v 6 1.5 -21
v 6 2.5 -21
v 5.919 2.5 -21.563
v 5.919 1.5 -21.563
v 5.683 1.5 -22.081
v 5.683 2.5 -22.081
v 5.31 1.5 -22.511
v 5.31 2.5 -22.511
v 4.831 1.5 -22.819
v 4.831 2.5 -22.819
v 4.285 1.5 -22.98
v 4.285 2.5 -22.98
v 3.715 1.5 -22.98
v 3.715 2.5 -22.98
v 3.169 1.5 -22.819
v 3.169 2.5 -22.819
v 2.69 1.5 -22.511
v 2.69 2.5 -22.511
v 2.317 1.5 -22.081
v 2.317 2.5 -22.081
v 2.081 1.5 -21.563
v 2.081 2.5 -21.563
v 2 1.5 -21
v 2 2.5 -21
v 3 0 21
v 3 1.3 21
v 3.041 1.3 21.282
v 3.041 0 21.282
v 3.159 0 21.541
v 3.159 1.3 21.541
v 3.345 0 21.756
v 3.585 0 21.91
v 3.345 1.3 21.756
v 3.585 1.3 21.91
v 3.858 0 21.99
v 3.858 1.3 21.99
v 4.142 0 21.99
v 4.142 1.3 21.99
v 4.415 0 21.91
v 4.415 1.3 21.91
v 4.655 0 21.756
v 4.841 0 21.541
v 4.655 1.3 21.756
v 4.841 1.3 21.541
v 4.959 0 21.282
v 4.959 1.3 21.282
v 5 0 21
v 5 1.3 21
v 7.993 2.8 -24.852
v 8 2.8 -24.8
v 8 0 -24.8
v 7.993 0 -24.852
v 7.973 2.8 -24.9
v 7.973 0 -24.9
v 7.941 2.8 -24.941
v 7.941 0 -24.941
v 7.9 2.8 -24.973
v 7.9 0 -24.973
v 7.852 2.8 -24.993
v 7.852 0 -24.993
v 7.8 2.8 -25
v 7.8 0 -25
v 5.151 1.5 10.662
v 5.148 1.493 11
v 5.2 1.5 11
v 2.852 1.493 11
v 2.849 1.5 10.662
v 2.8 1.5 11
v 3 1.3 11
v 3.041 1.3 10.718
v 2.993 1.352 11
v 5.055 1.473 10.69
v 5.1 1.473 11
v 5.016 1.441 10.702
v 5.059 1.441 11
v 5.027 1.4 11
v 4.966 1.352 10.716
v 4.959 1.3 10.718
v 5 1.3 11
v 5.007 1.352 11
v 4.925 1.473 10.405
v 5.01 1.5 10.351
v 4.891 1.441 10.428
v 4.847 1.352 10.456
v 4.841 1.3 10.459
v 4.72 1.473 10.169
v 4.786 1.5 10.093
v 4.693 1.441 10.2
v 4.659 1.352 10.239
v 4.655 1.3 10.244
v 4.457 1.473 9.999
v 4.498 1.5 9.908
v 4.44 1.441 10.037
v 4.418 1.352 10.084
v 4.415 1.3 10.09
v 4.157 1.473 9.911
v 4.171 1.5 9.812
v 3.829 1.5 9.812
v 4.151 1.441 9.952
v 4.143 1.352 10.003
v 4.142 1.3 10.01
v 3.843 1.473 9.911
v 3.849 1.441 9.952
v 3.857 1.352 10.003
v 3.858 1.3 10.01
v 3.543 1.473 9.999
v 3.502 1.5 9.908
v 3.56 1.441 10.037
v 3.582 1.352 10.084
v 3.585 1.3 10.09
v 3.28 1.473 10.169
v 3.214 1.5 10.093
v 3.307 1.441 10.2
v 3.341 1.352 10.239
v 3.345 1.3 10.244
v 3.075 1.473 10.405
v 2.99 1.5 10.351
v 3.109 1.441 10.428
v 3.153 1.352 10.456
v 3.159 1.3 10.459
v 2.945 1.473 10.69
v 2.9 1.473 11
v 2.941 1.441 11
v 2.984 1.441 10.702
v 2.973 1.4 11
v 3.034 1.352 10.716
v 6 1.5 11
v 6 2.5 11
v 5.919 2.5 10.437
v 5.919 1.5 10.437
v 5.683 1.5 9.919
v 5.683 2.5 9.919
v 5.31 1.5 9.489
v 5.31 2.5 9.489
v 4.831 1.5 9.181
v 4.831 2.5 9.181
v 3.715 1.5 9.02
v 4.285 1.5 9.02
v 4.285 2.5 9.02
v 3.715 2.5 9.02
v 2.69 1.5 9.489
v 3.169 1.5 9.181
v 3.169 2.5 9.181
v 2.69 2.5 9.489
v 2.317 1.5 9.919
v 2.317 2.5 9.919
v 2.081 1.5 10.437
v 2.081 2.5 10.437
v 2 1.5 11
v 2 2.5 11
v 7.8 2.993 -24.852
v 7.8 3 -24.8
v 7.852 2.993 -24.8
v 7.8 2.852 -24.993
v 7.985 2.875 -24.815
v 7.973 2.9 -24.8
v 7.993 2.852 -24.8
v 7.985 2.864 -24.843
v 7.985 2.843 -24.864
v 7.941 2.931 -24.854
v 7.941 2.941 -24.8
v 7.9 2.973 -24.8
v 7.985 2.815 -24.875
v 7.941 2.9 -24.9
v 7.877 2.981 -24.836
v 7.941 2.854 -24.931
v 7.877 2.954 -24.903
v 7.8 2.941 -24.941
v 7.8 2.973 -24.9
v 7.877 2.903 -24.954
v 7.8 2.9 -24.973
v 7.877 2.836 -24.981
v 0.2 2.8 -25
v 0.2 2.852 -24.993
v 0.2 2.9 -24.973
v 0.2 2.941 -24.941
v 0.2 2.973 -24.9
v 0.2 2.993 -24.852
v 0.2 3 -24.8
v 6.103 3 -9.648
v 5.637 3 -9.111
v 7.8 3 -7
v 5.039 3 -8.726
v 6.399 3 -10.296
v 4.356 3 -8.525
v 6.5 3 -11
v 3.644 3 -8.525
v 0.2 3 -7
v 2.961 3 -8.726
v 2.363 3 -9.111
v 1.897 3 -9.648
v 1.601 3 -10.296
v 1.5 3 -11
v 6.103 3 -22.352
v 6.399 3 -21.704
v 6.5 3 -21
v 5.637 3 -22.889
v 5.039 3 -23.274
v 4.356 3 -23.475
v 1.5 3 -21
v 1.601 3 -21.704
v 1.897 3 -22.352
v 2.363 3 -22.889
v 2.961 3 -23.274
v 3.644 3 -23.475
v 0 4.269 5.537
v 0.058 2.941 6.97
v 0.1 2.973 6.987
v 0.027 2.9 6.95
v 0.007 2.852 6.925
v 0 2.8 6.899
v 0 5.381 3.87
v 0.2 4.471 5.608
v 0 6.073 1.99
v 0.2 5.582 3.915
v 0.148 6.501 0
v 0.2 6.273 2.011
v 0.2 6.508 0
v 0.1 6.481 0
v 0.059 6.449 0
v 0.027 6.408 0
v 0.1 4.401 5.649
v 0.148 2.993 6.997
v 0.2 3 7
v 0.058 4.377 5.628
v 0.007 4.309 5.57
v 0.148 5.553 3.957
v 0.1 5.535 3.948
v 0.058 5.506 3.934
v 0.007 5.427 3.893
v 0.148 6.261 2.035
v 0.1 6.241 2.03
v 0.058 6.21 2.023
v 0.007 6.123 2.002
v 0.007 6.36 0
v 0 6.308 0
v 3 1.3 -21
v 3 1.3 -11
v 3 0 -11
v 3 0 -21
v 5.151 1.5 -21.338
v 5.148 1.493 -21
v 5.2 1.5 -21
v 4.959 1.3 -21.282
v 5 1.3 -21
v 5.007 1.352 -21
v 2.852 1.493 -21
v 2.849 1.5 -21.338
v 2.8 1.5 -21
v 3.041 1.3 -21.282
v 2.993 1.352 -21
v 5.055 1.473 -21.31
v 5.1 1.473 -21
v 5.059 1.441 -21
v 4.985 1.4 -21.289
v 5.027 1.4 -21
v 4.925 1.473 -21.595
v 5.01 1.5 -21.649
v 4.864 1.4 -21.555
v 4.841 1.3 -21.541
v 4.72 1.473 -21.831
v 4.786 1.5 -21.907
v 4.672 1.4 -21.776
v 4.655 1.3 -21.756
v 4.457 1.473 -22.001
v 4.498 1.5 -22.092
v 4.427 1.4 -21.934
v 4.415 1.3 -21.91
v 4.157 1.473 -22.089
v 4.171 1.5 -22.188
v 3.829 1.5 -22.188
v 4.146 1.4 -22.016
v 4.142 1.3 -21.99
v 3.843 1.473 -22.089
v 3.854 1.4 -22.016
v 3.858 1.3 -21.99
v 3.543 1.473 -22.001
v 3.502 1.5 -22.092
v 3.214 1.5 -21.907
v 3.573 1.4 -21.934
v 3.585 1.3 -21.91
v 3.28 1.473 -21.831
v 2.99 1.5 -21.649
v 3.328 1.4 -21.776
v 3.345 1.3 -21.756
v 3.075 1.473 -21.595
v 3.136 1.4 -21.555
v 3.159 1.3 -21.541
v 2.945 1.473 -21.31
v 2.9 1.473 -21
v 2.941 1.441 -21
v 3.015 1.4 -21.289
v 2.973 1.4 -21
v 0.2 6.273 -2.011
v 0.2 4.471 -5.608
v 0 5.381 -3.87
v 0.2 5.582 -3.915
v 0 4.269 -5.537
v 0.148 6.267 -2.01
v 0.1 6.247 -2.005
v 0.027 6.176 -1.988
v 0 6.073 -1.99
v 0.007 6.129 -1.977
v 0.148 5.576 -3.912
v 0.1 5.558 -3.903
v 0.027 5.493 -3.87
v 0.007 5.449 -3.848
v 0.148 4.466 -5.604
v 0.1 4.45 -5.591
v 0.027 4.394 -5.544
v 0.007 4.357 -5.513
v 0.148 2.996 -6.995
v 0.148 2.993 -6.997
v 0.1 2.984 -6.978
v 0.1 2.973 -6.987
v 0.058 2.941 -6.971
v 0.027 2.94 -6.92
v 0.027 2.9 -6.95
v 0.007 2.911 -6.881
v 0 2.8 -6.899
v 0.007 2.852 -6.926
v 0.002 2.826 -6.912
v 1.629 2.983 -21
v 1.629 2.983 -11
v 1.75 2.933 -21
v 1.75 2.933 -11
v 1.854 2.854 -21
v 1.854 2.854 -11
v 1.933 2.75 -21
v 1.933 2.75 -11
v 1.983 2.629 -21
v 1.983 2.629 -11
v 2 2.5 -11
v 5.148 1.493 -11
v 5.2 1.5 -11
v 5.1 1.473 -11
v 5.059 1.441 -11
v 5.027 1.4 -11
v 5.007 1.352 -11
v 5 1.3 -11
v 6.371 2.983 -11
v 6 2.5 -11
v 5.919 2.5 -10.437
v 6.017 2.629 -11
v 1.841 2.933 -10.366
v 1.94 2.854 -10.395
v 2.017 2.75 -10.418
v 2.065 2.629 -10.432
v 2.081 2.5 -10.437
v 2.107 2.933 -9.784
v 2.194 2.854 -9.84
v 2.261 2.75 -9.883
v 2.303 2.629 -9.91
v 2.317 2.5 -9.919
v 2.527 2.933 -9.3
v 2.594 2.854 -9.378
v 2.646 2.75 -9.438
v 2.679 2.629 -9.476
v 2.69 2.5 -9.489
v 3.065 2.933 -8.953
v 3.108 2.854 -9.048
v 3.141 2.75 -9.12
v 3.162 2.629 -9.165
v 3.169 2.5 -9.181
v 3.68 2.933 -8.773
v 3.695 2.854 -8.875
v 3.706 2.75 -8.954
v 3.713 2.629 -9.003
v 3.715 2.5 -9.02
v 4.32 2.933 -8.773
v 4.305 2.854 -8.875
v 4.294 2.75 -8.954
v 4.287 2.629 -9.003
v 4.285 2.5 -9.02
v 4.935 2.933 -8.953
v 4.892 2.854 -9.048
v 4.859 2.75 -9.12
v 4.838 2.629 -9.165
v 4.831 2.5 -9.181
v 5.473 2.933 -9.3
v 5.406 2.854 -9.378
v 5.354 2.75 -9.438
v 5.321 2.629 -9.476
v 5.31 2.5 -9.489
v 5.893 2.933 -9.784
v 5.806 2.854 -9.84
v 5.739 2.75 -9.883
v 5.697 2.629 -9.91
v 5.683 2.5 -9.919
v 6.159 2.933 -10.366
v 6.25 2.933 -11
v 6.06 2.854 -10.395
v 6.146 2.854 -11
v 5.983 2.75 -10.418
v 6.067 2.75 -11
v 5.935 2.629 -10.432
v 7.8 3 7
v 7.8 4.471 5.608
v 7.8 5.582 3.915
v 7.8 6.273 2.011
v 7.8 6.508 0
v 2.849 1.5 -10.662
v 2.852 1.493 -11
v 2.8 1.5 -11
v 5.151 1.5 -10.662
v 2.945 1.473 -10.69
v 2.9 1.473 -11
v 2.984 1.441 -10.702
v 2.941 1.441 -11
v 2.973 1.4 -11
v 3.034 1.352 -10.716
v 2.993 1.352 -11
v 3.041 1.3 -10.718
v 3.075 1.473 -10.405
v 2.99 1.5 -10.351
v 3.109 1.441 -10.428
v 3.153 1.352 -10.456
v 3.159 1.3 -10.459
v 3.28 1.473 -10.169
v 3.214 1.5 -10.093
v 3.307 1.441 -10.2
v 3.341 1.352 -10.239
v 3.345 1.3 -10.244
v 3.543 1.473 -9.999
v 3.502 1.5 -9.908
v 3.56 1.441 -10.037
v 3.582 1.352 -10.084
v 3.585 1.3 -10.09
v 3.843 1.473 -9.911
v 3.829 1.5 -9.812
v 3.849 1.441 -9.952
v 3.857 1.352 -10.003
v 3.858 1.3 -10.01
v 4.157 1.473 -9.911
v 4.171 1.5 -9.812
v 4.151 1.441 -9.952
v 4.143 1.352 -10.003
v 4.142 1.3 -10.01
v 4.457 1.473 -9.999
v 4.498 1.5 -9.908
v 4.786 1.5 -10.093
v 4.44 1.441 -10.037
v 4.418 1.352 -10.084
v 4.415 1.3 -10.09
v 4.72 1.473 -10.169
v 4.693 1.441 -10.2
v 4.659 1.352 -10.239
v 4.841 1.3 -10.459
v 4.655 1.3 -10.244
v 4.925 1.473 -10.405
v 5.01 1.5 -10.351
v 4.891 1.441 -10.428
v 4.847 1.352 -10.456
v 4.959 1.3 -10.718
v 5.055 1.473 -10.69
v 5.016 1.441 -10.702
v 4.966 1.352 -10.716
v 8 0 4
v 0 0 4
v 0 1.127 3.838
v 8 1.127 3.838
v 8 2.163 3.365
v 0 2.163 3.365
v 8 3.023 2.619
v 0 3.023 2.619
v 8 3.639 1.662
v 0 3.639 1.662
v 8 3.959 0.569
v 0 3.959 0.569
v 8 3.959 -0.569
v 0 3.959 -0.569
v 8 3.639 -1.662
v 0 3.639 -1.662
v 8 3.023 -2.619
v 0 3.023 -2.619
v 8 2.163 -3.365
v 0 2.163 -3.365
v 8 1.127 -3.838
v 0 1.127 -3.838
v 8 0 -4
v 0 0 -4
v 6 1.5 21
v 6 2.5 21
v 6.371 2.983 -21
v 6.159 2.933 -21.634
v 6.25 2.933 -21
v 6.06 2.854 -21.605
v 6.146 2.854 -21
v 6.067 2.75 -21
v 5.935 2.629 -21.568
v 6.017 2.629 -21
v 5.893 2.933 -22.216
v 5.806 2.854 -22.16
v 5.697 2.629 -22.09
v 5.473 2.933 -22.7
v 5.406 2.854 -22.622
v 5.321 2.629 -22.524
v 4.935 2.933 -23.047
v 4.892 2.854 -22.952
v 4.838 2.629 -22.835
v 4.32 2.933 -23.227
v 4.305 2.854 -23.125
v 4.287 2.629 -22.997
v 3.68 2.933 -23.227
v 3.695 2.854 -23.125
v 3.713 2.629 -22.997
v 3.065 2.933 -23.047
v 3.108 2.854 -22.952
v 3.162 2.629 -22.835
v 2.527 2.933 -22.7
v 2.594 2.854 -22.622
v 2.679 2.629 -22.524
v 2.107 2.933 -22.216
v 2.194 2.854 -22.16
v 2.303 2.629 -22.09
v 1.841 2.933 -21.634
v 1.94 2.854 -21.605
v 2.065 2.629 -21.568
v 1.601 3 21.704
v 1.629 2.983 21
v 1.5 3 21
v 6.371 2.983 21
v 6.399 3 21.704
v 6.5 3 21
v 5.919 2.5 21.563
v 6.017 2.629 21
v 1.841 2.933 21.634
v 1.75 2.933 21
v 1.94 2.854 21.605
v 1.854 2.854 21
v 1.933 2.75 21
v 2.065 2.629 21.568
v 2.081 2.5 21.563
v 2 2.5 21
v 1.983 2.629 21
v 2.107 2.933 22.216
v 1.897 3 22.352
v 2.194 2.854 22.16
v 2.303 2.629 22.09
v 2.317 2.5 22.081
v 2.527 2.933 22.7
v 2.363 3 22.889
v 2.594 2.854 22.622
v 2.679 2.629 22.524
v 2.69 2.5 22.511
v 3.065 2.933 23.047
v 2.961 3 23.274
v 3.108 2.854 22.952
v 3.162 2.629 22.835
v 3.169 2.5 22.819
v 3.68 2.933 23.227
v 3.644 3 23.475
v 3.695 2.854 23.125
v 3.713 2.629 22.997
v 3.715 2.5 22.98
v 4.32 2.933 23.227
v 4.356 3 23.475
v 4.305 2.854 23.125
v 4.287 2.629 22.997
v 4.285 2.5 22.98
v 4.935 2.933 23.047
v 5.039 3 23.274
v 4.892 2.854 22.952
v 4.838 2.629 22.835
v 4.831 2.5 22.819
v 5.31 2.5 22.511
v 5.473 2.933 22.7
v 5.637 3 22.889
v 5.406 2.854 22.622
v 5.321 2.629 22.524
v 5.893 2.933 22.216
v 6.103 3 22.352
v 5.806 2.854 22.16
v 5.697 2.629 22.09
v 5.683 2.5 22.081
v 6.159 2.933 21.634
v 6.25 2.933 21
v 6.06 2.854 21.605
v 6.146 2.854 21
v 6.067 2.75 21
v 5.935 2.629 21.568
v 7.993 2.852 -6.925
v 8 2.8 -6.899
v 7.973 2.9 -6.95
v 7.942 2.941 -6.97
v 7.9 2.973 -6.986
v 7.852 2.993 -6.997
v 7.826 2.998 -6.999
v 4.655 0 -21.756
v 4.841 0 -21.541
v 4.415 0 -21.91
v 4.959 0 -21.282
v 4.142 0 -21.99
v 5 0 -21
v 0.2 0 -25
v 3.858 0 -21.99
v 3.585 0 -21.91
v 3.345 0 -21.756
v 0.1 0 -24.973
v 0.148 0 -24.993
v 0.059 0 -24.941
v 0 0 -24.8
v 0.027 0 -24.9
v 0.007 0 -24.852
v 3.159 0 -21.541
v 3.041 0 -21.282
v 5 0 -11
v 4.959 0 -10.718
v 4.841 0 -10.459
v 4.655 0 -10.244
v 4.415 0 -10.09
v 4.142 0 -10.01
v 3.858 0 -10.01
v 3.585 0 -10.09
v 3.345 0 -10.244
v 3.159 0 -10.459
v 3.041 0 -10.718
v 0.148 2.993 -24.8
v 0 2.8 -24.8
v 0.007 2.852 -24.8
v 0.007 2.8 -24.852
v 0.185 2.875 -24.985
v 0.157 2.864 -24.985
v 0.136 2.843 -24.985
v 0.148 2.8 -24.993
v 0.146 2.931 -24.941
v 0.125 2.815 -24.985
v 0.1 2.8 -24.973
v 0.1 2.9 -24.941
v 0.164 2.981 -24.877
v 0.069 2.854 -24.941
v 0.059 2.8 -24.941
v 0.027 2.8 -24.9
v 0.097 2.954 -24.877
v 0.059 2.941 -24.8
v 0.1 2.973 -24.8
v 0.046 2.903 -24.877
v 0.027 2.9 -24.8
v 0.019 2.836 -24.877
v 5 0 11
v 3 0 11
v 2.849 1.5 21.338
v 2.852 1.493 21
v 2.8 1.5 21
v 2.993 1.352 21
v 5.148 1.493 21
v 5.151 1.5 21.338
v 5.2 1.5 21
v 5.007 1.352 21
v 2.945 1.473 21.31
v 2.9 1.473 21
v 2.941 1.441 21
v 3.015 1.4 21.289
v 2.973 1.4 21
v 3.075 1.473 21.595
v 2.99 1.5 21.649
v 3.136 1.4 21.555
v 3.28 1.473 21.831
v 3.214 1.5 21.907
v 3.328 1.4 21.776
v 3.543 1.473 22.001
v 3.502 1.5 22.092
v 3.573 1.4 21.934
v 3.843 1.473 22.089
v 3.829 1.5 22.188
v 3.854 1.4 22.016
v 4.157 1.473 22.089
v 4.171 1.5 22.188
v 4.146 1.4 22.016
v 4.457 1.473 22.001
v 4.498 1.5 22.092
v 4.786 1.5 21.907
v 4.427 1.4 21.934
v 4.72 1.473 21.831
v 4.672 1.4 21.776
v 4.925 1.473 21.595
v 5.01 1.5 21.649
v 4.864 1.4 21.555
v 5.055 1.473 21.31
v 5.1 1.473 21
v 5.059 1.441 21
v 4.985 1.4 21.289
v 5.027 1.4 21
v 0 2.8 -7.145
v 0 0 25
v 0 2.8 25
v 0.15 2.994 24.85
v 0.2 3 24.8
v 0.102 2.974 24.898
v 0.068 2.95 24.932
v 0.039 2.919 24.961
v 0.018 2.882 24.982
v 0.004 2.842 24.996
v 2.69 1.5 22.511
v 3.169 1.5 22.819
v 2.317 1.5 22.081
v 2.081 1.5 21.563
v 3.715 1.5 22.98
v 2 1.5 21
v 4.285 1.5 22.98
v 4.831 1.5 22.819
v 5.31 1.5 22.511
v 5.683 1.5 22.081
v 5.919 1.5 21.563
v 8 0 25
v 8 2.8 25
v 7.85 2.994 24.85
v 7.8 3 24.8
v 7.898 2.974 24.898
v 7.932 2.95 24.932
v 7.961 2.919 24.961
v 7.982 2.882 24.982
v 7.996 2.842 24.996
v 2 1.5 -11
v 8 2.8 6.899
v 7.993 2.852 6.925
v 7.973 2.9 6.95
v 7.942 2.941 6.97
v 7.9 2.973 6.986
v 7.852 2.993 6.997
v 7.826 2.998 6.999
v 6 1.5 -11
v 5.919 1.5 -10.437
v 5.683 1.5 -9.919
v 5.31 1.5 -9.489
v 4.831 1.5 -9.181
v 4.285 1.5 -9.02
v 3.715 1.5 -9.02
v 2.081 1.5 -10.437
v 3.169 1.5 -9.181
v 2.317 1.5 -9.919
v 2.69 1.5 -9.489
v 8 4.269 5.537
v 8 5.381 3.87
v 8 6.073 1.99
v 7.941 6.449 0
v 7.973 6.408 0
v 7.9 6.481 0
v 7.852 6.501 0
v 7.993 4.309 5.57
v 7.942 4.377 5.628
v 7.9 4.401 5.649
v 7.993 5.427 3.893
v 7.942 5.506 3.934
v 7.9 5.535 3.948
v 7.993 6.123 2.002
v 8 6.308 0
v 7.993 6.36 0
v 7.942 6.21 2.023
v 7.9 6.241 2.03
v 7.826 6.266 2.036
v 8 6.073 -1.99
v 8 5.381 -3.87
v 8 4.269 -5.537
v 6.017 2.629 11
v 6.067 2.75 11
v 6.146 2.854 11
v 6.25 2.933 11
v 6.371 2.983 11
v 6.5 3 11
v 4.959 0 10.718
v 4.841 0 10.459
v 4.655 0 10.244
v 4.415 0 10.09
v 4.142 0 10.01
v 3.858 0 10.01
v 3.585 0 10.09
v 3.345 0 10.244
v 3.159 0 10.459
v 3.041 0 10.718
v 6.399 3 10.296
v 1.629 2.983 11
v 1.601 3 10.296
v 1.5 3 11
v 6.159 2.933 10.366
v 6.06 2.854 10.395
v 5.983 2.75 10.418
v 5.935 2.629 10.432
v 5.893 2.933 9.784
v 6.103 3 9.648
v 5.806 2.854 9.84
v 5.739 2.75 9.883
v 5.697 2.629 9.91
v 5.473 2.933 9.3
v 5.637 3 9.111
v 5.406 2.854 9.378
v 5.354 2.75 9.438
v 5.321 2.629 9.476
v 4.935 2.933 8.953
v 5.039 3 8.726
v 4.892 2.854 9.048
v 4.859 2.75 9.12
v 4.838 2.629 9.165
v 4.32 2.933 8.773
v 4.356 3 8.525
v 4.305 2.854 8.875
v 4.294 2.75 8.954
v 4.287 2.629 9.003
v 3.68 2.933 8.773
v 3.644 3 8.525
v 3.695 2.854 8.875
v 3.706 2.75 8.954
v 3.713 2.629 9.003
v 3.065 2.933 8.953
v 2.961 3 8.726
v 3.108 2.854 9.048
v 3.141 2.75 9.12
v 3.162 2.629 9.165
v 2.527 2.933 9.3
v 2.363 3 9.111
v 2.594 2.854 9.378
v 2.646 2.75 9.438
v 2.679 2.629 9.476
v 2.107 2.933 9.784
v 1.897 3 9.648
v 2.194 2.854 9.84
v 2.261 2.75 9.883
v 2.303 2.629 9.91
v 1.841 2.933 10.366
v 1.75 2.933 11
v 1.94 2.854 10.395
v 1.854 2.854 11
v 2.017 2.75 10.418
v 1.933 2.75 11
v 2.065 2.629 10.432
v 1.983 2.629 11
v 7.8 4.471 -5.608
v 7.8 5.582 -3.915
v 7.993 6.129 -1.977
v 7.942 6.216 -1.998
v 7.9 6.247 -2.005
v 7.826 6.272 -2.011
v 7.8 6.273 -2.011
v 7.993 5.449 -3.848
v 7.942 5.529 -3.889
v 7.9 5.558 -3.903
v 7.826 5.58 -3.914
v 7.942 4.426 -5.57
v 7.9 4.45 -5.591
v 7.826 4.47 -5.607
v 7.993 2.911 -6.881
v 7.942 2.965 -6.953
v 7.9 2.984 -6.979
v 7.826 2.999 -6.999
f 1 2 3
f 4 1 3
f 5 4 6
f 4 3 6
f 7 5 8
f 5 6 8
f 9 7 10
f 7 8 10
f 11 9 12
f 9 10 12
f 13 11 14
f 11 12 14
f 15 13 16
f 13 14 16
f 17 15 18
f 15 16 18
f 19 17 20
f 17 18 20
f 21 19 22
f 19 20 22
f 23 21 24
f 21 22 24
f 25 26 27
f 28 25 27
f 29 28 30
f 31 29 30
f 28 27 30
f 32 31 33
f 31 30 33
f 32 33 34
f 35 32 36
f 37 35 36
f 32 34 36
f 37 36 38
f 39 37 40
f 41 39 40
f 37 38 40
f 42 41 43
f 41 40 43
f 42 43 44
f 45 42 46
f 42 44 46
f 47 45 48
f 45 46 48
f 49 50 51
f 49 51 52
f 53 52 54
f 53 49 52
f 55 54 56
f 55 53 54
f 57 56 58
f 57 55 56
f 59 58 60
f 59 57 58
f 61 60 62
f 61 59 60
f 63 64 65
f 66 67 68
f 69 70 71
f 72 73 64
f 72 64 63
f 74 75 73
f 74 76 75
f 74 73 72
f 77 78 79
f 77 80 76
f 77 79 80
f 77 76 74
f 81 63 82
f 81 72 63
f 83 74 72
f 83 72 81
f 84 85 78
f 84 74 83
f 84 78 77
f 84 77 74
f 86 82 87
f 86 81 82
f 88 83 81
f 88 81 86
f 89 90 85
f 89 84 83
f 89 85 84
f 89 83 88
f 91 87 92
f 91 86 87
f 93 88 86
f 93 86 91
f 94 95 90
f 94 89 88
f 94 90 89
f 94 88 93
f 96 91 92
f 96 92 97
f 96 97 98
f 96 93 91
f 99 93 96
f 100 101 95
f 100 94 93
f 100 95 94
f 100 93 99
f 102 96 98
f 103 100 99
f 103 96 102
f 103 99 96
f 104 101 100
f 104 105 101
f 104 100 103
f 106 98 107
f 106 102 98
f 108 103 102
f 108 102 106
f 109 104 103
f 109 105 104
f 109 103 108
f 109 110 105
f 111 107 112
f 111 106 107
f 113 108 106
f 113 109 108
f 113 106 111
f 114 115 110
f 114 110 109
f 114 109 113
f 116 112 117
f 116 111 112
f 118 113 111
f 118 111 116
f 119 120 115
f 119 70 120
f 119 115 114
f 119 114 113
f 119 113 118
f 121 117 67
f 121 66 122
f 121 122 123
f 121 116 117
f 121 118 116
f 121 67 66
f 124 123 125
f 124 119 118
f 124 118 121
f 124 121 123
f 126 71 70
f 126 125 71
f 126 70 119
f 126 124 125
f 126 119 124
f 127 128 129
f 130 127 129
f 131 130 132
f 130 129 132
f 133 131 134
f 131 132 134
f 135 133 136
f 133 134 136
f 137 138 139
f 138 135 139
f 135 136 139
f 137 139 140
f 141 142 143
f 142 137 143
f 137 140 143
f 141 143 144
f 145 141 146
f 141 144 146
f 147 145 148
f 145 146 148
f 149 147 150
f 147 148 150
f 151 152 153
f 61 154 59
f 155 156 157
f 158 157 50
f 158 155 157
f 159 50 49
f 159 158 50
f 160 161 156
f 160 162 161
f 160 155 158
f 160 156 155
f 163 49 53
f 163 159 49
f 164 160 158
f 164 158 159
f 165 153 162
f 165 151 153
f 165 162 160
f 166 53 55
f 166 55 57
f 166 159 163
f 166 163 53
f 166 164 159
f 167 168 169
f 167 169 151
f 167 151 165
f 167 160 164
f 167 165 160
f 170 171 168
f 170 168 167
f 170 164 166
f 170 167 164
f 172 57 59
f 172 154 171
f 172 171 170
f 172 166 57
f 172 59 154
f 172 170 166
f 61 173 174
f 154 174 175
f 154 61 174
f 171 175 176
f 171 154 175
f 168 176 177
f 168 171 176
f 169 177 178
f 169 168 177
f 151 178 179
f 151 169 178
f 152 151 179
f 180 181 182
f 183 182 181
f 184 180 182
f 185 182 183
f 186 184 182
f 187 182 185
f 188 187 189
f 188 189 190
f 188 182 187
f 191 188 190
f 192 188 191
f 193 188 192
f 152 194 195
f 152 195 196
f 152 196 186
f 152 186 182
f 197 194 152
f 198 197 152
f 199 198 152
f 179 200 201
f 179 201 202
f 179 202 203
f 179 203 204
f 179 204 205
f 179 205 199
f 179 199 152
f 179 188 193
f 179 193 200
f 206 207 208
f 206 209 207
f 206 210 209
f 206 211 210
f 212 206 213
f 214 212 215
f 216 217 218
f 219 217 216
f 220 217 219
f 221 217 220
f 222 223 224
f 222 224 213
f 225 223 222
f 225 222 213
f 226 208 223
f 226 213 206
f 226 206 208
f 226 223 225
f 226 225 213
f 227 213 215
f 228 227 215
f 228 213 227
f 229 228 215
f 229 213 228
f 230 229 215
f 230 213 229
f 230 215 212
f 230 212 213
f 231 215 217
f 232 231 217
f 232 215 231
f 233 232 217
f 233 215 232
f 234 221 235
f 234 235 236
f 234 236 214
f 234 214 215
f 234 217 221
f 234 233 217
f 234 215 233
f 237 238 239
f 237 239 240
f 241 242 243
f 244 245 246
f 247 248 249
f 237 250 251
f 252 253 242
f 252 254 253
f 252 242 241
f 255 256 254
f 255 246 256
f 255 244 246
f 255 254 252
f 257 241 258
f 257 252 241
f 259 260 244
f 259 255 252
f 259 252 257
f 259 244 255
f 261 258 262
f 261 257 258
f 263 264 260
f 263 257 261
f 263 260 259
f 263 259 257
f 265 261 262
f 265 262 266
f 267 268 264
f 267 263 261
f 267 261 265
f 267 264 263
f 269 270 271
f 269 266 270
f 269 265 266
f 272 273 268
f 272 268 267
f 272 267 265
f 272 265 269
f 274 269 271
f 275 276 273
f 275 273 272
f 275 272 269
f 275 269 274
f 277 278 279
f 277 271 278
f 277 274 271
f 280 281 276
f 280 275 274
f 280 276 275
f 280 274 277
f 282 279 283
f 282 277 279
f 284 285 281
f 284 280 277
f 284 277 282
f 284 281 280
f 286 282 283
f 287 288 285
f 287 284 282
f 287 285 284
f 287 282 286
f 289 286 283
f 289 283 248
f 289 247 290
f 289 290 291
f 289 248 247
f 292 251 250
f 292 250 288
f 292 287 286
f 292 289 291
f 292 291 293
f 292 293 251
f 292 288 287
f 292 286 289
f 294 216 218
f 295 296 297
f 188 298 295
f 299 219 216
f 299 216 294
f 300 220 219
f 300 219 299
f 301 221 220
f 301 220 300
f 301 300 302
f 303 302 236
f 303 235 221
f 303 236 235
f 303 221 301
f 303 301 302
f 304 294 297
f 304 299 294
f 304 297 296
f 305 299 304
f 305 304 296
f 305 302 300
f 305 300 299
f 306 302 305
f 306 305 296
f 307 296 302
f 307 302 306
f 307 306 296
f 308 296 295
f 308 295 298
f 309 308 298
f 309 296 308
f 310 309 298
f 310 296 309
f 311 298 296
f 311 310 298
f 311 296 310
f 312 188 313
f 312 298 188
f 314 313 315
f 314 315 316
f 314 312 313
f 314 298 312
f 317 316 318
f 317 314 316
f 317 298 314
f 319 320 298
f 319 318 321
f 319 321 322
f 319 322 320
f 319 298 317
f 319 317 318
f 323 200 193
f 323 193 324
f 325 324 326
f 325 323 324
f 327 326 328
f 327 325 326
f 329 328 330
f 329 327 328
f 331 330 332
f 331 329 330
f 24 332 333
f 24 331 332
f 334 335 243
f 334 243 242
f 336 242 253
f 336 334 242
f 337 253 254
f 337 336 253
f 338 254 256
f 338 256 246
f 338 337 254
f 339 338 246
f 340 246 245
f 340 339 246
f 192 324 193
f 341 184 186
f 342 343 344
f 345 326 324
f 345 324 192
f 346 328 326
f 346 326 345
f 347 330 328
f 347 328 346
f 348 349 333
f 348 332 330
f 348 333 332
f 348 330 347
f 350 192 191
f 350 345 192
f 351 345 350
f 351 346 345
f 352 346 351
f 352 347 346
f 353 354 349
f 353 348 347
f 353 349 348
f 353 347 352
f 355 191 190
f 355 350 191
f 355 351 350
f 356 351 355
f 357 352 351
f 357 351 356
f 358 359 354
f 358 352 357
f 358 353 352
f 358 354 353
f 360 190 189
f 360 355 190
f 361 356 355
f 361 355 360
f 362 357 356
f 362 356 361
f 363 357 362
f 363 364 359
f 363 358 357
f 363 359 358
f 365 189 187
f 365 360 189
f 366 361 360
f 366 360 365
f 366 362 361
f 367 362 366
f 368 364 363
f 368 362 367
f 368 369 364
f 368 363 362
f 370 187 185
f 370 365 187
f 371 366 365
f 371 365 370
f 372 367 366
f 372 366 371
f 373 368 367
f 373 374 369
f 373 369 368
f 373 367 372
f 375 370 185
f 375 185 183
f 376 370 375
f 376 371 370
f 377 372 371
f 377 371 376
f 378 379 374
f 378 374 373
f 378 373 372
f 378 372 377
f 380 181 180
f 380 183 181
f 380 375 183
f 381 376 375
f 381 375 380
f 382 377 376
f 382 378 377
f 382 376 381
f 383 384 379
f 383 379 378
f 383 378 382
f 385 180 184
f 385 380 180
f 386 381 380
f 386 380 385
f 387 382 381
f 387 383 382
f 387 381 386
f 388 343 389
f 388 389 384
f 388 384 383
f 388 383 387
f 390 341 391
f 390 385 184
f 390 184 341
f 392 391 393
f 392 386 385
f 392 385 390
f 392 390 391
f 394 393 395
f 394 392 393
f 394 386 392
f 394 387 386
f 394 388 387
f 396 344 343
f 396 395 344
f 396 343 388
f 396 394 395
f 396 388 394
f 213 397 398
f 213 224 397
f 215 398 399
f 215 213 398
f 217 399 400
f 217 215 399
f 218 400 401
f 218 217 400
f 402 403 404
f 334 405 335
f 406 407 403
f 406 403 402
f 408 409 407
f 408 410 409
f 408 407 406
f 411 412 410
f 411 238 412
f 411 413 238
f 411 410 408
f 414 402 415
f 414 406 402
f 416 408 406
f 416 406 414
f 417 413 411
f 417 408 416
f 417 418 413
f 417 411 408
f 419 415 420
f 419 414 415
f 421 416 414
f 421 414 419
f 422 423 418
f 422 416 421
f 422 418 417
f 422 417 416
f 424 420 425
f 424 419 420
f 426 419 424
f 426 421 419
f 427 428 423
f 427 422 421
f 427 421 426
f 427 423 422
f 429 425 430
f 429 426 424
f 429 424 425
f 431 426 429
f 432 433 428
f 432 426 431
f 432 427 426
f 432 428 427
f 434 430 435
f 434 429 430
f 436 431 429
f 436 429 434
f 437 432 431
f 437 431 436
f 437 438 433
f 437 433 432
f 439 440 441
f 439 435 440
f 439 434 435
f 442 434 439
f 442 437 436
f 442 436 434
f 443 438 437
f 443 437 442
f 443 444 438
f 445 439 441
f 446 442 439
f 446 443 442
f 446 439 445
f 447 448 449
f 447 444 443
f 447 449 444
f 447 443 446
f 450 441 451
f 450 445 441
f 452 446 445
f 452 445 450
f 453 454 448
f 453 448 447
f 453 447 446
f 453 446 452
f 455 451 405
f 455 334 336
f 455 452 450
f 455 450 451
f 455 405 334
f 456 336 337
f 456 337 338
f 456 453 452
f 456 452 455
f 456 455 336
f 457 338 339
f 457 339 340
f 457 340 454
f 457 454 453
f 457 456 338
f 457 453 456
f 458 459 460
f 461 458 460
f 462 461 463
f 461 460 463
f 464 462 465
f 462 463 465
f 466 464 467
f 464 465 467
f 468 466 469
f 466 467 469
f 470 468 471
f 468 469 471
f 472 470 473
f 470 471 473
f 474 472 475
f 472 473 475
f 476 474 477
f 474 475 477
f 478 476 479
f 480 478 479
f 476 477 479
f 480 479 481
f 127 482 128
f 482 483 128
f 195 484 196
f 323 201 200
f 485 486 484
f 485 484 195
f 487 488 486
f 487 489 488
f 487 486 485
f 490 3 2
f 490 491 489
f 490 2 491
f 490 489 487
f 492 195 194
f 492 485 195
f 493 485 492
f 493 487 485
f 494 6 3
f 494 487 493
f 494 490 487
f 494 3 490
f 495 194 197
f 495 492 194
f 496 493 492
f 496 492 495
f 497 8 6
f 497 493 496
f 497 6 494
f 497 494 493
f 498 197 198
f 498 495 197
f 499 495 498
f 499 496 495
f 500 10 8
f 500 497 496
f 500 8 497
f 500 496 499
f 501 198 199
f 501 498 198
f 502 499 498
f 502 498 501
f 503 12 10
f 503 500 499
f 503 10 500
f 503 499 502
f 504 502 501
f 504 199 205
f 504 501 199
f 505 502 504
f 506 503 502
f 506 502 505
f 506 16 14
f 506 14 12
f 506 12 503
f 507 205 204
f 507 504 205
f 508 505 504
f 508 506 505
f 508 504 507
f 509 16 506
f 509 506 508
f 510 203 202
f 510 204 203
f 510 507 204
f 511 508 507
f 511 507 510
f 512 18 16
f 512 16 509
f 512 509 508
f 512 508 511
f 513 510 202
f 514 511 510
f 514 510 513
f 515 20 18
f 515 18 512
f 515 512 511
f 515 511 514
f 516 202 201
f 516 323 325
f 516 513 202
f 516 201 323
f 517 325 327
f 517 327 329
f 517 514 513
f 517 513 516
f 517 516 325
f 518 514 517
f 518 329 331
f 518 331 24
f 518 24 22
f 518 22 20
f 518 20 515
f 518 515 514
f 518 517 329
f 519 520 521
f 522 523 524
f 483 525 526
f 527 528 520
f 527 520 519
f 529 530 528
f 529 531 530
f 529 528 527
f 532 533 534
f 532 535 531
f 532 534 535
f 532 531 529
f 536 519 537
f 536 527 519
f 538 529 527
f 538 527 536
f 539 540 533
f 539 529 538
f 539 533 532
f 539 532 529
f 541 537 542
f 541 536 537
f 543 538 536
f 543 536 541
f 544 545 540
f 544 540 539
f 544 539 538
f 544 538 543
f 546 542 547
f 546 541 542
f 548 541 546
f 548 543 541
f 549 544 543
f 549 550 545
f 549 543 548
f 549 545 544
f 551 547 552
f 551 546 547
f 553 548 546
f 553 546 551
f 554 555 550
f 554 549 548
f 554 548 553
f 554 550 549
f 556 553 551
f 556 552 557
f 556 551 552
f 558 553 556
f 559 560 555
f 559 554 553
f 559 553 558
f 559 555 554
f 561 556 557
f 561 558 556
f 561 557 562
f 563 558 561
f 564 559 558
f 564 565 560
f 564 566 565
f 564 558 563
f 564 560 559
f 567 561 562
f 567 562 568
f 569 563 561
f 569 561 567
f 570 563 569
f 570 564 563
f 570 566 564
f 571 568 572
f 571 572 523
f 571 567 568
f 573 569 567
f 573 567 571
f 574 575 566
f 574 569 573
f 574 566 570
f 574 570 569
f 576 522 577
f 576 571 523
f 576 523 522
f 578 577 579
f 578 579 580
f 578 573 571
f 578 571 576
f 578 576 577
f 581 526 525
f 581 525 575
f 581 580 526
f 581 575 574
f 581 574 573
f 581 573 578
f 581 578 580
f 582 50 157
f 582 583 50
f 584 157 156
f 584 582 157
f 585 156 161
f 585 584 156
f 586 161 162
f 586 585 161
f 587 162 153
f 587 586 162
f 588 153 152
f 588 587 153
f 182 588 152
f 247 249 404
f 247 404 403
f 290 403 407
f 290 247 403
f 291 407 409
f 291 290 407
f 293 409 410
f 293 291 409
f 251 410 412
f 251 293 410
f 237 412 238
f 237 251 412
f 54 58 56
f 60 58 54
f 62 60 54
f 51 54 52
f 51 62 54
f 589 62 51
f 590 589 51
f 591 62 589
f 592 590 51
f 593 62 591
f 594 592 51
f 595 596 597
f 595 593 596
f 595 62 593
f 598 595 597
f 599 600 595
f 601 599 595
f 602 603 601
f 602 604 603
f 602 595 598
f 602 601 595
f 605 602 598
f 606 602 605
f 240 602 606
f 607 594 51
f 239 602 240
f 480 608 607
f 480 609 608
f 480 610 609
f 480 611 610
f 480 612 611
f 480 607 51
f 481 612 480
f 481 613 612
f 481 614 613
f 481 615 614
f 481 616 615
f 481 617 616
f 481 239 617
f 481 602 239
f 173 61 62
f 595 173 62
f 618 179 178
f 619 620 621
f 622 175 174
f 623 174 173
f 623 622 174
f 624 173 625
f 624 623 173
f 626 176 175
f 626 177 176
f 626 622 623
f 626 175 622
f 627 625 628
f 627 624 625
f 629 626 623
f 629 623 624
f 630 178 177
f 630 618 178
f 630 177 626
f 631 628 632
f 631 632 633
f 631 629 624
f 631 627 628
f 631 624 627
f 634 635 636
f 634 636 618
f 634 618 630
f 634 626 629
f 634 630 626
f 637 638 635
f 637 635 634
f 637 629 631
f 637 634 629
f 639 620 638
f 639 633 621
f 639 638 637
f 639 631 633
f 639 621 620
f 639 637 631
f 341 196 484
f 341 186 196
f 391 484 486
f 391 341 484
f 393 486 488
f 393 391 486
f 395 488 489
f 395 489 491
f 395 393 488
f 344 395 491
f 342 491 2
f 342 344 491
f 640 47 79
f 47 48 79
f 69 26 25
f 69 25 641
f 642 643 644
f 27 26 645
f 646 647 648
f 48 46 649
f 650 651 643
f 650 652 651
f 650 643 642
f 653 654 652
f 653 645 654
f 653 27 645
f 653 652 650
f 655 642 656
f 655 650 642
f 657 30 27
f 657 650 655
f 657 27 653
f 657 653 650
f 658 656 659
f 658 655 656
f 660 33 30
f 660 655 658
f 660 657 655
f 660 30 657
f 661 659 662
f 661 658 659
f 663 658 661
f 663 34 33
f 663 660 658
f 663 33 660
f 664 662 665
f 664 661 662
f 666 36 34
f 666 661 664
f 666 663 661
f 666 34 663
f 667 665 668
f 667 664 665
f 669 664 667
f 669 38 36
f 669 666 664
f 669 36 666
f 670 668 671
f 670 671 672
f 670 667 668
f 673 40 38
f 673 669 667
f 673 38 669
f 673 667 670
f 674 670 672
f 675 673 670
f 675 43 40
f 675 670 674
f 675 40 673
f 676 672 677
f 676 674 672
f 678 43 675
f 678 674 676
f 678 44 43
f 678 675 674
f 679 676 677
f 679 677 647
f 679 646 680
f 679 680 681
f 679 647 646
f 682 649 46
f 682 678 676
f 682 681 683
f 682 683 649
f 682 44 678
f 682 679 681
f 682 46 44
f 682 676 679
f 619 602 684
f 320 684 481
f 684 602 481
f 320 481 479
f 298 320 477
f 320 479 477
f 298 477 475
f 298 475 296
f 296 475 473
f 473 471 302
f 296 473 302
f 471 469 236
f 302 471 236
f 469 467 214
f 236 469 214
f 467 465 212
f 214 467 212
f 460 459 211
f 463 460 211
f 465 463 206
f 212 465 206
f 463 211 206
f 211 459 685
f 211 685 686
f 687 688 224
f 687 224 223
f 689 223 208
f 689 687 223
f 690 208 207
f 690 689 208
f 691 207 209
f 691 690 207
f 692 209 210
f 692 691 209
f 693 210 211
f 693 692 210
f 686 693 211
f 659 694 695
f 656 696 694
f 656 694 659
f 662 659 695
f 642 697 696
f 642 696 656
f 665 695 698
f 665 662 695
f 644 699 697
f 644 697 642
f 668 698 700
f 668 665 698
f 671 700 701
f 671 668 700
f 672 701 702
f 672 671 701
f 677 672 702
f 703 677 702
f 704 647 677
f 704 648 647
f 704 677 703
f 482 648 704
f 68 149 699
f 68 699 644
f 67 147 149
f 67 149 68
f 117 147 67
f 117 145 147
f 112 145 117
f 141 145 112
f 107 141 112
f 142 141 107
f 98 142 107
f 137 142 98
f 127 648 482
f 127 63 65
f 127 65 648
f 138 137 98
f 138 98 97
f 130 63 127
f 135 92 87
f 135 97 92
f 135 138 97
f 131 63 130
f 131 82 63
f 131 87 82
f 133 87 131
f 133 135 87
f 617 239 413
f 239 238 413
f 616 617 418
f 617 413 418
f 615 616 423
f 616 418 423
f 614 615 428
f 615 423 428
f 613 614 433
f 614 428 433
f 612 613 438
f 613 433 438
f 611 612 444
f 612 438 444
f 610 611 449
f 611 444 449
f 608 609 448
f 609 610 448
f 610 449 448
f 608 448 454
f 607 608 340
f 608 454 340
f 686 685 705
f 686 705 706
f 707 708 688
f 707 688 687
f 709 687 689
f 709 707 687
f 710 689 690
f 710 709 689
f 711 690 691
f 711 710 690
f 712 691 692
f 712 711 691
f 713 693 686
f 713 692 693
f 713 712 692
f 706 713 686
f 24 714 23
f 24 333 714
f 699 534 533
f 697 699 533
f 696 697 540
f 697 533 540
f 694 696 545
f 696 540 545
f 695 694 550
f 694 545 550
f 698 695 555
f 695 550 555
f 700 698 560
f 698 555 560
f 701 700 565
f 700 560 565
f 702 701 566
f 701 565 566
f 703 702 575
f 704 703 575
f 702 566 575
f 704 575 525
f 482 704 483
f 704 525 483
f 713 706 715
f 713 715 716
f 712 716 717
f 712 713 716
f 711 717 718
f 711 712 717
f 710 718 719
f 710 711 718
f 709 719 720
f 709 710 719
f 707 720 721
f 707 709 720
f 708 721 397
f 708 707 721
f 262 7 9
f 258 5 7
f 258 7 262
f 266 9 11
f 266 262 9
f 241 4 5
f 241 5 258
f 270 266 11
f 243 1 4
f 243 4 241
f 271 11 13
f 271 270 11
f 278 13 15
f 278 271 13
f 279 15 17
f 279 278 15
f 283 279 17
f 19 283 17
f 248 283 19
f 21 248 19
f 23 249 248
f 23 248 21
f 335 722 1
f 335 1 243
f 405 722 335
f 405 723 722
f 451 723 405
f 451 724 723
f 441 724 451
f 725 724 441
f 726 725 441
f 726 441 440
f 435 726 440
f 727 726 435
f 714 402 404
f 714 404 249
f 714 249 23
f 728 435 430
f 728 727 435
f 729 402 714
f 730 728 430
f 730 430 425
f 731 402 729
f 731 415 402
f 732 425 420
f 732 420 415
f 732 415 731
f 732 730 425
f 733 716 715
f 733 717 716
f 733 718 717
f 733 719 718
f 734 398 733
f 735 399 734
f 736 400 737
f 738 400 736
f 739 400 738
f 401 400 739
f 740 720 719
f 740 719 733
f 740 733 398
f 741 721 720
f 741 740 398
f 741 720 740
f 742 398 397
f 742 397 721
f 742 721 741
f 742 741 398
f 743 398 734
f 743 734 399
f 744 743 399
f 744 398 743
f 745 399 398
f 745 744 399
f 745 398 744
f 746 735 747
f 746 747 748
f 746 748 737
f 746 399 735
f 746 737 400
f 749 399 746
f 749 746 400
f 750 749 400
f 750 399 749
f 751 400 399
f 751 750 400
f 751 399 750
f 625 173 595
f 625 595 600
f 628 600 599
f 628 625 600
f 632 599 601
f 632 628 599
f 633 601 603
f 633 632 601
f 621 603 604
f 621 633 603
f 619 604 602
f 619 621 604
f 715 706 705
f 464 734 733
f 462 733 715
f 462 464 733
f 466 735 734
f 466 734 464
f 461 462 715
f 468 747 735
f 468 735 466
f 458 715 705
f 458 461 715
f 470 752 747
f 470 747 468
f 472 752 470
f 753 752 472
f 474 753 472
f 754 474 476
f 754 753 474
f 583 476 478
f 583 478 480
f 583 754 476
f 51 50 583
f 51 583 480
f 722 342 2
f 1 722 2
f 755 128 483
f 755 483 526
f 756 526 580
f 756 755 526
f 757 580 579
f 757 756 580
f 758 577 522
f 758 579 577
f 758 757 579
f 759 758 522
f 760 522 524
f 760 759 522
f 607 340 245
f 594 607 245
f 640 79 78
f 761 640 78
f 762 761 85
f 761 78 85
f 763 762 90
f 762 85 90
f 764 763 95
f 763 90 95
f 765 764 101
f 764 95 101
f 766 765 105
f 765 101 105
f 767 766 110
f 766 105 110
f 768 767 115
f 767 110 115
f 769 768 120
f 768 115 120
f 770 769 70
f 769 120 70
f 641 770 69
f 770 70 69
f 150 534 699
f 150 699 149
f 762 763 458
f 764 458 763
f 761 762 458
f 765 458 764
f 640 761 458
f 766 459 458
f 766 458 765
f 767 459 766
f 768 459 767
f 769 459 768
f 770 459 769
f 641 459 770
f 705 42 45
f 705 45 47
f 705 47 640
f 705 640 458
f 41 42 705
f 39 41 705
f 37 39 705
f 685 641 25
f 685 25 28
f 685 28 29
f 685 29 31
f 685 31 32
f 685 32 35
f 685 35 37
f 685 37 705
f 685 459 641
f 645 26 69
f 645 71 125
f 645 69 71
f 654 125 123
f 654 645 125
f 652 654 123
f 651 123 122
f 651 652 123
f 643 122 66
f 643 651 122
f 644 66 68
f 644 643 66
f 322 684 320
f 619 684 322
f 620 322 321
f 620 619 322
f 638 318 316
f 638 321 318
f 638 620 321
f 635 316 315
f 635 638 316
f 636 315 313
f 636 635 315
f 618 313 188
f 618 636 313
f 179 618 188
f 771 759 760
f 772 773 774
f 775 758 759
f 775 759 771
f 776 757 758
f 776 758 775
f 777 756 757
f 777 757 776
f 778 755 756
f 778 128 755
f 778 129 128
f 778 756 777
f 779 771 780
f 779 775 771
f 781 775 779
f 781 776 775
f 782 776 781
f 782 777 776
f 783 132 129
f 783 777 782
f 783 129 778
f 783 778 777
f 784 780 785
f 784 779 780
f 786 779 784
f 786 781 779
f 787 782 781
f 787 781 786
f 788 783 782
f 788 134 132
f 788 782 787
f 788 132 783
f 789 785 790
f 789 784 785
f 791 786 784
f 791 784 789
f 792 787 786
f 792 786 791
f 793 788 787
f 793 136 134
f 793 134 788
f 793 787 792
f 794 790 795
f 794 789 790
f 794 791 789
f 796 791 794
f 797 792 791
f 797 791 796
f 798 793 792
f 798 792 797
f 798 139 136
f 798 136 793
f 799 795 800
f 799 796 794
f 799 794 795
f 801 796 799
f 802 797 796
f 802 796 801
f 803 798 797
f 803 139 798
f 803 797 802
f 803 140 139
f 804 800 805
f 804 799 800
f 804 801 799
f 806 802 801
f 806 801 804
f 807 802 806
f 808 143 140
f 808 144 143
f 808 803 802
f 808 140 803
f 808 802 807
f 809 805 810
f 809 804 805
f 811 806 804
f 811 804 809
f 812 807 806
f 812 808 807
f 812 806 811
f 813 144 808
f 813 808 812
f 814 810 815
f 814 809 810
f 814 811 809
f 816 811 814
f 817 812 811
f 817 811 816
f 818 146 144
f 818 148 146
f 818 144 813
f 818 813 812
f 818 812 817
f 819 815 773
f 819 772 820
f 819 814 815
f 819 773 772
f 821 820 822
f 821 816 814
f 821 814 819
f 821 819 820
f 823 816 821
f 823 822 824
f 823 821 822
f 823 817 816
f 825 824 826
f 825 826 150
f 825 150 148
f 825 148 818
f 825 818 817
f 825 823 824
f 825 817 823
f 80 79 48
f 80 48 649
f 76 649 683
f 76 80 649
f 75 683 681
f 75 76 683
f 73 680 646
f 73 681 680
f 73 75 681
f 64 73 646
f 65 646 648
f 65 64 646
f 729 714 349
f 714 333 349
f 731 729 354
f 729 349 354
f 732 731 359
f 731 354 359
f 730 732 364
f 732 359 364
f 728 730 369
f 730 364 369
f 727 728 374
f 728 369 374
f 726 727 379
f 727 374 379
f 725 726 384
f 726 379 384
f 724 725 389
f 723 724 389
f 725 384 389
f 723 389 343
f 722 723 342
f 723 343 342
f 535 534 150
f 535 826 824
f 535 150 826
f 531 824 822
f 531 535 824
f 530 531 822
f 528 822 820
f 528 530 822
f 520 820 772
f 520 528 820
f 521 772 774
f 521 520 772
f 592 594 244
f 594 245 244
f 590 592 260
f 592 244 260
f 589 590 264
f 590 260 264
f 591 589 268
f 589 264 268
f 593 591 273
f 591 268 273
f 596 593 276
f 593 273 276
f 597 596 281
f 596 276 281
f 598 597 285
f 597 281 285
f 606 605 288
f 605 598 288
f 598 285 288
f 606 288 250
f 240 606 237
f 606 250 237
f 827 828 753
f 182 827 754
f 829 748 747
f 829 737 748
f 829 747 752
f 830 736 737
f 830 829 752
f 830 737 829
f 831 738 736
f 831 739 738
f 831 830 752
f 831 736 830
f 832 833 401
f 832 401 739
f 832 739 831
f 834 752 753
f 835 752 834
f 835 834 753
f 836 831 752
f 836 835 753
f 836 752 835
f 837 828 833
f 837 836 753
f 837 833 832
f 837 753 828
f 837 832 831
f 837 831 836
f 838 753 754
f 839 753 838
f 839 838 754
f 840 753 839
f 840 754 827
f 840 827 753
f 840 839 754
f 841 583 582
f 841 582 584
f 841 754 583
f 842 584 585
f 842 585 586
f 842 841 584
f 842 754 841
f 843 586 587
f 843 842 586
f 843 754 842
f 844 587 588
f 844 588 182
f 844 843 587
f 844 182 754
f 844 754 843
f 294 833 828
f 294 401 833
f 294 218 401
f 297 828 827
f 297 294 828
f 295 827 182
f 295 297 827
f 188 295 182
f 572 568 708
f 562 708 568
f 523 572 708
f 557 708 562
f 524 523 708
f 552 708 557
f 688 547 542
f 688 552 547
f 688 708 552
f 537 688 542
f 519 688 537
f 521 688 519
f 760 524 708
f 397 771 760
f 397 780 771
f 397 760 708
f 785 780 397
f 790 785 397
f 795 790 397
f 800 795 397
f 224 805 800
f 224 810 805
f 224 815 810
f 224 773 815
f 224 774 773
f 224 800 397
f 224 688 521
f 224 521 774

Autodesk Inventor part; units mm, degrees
ref_plane "YZ Plane" through (0, 0, 0) normal (1, 0, 0) x (0, 1, 0)
ref_plane "XZ Plane" through (0, 0, 0) normal (0, 1, 0) x (-1, 0, 0)
ref_plane "XY Plane" through (0, 0, 0) normal (0, 0, 1) x (1, 0, 0)
sketch "Sketch1" plane through (0, 0, 0) normal (1, 0, 0) x (0, 1, 0)
  point P0 (0, 0)
sketch "Sketch2" plane through (0, 0, 0) normal (1, 0, 0) x (0, 1, 0)
  line L0 (0, 25) -> (3, 25)
  arc A0 (0, 4) -> (0, 4) centre (0, 0.0048) ccw
  line L1 (3, 25) -> (3, 7)
  line L2 (6.5079, 0) -> (4, 0)
  arc A1 (6.5079, 0) -> (3, 7) centre (-2.2302, 0) ccw
  arc A2 (4, 0) -> (0, 4) centre (0, 0) ccw
  line L3 (0, 4) -> (0, 25)
  point P0 (0, 0)
  dimension "d0" = 25
  dimension "d1" = 3
  dimension "d2" = 4
  dimension "d5" = 18
  dimension "d22" = 4
extrude "Extrusion1" add sketch "Sketch2" along normal blind 8 contours L0 L1 A1 L2 A2 L3
sketch "Sketch3" plane through (0, 3, 25) normal (0, 1, 0) x (1, 0, 0)
  line L0 (0, 0) -> (8, 0)
  line L1 (8, 0) -> (4, 0)
  line L2 (4, 0) -> (4, 21)
  line L3 (4, 21) -> (0, 21)
  line L4 (0, 21) -> (4, 21)
  line L5 (8, 21) -> (0, 21) projected
  line L6 (4, 0) -> (4, 2)
  line L7 (4, 2) -> (4, 4)
  circle A0 centre (4, 4) radius 2
  line L8 (0, 18) -> (8, 18) projected
  line L9 (4, 18) -> (4, 14)
  circle A1 centre (4, 14) radius 2
  line L10 (2, 4) -> (2, 14)
  line L11 (6, 4) -> (6, 14)
  point P0 (0, 25)
  dimension "d10" = 2
  dimension "d11" = 2
  dimension "d12" = 4
  dimension "d13" = 4
extrude "Extrusion2" cut sketch "Sketch3" against normal blind 1.5
sketch "Sketch4" plane through (0, 1.5, 25) normal (0, 1, 0) x (1, 0, 0)
  arc A0 (6, 14) -> (2, 14) centre (4, 14) ccw projected
  line L0 (2, 14) -> (4, 14)
  line L1 (4, 14) -> (6, 14)
  line L2 (6, 14) -> (6, 4)
  arc A1 (2, 4) -> (6, 4) centre (4, 4) ccw projected
  line L3 (6, 4) -> (2, 4)
  line L4 (2, 4) -> (2, 14)
  line L5 (2, 4) -> (2, 14) projected
  circle A2 centre (4, 4) radius 1
  line L6 (4, 4) -> (4, 14)
  line L7 (0, 0) -> (8, 0) projected
  circle A3 centre (4, 14) radius 1
  line L8 (3, 4) -> (3, 14)
  line L9 (5, 4) -> (5, 14)
  point P0 (0, 25)
  dimension "d16" = 2
  dimension "d17" = 2
extrude "Extrusion3" cut sketch "Sketch4" against normal blind 1.5 contours A3 L6 L1 | L1 L0 A3 | L9 A2 L6 A3 | L0 L6 A3 | A3 L6 A2 L8 | A2 L3 | L3 L6 A2 | A2 L6 L3
fillet "Fillet1" radius 0.5 4 edges at (6, 3, 16) (4, 3, 23) (2, 3, 16) (4, 3, 9)
fillet "Fillet2" radius 0.2 4 edges at (5, 1.5, 16) (4, 1.5, 22) (3, 1.5, 16) (4, 1.5, 10)
sketch "Sketch5" plane through (0, 0, 0) normal (0, 0, 1) x (1, 0, 0)
  point P0 (0, 0)
mirror "Mirror1" about plane through (0, 0, 0) normal (0, 0, 1)
fillet "Fillet3" radius 0.2 1 edges at (0, 3, -16)
fillet "Fillet4" radius 0.2 2 edges at (4, 3, -25) (0, 1.5, -25)
fillet "Fillet5" radius 0.2 7 edges at (8, 1.5, -25) (8, 3, -16) (8, 5.5819, 3.9149) (0, 5.5819, 3.9149) (8, 3, 16) (4, 3, 25) (0, 3, 16)
properties part number "holder"
